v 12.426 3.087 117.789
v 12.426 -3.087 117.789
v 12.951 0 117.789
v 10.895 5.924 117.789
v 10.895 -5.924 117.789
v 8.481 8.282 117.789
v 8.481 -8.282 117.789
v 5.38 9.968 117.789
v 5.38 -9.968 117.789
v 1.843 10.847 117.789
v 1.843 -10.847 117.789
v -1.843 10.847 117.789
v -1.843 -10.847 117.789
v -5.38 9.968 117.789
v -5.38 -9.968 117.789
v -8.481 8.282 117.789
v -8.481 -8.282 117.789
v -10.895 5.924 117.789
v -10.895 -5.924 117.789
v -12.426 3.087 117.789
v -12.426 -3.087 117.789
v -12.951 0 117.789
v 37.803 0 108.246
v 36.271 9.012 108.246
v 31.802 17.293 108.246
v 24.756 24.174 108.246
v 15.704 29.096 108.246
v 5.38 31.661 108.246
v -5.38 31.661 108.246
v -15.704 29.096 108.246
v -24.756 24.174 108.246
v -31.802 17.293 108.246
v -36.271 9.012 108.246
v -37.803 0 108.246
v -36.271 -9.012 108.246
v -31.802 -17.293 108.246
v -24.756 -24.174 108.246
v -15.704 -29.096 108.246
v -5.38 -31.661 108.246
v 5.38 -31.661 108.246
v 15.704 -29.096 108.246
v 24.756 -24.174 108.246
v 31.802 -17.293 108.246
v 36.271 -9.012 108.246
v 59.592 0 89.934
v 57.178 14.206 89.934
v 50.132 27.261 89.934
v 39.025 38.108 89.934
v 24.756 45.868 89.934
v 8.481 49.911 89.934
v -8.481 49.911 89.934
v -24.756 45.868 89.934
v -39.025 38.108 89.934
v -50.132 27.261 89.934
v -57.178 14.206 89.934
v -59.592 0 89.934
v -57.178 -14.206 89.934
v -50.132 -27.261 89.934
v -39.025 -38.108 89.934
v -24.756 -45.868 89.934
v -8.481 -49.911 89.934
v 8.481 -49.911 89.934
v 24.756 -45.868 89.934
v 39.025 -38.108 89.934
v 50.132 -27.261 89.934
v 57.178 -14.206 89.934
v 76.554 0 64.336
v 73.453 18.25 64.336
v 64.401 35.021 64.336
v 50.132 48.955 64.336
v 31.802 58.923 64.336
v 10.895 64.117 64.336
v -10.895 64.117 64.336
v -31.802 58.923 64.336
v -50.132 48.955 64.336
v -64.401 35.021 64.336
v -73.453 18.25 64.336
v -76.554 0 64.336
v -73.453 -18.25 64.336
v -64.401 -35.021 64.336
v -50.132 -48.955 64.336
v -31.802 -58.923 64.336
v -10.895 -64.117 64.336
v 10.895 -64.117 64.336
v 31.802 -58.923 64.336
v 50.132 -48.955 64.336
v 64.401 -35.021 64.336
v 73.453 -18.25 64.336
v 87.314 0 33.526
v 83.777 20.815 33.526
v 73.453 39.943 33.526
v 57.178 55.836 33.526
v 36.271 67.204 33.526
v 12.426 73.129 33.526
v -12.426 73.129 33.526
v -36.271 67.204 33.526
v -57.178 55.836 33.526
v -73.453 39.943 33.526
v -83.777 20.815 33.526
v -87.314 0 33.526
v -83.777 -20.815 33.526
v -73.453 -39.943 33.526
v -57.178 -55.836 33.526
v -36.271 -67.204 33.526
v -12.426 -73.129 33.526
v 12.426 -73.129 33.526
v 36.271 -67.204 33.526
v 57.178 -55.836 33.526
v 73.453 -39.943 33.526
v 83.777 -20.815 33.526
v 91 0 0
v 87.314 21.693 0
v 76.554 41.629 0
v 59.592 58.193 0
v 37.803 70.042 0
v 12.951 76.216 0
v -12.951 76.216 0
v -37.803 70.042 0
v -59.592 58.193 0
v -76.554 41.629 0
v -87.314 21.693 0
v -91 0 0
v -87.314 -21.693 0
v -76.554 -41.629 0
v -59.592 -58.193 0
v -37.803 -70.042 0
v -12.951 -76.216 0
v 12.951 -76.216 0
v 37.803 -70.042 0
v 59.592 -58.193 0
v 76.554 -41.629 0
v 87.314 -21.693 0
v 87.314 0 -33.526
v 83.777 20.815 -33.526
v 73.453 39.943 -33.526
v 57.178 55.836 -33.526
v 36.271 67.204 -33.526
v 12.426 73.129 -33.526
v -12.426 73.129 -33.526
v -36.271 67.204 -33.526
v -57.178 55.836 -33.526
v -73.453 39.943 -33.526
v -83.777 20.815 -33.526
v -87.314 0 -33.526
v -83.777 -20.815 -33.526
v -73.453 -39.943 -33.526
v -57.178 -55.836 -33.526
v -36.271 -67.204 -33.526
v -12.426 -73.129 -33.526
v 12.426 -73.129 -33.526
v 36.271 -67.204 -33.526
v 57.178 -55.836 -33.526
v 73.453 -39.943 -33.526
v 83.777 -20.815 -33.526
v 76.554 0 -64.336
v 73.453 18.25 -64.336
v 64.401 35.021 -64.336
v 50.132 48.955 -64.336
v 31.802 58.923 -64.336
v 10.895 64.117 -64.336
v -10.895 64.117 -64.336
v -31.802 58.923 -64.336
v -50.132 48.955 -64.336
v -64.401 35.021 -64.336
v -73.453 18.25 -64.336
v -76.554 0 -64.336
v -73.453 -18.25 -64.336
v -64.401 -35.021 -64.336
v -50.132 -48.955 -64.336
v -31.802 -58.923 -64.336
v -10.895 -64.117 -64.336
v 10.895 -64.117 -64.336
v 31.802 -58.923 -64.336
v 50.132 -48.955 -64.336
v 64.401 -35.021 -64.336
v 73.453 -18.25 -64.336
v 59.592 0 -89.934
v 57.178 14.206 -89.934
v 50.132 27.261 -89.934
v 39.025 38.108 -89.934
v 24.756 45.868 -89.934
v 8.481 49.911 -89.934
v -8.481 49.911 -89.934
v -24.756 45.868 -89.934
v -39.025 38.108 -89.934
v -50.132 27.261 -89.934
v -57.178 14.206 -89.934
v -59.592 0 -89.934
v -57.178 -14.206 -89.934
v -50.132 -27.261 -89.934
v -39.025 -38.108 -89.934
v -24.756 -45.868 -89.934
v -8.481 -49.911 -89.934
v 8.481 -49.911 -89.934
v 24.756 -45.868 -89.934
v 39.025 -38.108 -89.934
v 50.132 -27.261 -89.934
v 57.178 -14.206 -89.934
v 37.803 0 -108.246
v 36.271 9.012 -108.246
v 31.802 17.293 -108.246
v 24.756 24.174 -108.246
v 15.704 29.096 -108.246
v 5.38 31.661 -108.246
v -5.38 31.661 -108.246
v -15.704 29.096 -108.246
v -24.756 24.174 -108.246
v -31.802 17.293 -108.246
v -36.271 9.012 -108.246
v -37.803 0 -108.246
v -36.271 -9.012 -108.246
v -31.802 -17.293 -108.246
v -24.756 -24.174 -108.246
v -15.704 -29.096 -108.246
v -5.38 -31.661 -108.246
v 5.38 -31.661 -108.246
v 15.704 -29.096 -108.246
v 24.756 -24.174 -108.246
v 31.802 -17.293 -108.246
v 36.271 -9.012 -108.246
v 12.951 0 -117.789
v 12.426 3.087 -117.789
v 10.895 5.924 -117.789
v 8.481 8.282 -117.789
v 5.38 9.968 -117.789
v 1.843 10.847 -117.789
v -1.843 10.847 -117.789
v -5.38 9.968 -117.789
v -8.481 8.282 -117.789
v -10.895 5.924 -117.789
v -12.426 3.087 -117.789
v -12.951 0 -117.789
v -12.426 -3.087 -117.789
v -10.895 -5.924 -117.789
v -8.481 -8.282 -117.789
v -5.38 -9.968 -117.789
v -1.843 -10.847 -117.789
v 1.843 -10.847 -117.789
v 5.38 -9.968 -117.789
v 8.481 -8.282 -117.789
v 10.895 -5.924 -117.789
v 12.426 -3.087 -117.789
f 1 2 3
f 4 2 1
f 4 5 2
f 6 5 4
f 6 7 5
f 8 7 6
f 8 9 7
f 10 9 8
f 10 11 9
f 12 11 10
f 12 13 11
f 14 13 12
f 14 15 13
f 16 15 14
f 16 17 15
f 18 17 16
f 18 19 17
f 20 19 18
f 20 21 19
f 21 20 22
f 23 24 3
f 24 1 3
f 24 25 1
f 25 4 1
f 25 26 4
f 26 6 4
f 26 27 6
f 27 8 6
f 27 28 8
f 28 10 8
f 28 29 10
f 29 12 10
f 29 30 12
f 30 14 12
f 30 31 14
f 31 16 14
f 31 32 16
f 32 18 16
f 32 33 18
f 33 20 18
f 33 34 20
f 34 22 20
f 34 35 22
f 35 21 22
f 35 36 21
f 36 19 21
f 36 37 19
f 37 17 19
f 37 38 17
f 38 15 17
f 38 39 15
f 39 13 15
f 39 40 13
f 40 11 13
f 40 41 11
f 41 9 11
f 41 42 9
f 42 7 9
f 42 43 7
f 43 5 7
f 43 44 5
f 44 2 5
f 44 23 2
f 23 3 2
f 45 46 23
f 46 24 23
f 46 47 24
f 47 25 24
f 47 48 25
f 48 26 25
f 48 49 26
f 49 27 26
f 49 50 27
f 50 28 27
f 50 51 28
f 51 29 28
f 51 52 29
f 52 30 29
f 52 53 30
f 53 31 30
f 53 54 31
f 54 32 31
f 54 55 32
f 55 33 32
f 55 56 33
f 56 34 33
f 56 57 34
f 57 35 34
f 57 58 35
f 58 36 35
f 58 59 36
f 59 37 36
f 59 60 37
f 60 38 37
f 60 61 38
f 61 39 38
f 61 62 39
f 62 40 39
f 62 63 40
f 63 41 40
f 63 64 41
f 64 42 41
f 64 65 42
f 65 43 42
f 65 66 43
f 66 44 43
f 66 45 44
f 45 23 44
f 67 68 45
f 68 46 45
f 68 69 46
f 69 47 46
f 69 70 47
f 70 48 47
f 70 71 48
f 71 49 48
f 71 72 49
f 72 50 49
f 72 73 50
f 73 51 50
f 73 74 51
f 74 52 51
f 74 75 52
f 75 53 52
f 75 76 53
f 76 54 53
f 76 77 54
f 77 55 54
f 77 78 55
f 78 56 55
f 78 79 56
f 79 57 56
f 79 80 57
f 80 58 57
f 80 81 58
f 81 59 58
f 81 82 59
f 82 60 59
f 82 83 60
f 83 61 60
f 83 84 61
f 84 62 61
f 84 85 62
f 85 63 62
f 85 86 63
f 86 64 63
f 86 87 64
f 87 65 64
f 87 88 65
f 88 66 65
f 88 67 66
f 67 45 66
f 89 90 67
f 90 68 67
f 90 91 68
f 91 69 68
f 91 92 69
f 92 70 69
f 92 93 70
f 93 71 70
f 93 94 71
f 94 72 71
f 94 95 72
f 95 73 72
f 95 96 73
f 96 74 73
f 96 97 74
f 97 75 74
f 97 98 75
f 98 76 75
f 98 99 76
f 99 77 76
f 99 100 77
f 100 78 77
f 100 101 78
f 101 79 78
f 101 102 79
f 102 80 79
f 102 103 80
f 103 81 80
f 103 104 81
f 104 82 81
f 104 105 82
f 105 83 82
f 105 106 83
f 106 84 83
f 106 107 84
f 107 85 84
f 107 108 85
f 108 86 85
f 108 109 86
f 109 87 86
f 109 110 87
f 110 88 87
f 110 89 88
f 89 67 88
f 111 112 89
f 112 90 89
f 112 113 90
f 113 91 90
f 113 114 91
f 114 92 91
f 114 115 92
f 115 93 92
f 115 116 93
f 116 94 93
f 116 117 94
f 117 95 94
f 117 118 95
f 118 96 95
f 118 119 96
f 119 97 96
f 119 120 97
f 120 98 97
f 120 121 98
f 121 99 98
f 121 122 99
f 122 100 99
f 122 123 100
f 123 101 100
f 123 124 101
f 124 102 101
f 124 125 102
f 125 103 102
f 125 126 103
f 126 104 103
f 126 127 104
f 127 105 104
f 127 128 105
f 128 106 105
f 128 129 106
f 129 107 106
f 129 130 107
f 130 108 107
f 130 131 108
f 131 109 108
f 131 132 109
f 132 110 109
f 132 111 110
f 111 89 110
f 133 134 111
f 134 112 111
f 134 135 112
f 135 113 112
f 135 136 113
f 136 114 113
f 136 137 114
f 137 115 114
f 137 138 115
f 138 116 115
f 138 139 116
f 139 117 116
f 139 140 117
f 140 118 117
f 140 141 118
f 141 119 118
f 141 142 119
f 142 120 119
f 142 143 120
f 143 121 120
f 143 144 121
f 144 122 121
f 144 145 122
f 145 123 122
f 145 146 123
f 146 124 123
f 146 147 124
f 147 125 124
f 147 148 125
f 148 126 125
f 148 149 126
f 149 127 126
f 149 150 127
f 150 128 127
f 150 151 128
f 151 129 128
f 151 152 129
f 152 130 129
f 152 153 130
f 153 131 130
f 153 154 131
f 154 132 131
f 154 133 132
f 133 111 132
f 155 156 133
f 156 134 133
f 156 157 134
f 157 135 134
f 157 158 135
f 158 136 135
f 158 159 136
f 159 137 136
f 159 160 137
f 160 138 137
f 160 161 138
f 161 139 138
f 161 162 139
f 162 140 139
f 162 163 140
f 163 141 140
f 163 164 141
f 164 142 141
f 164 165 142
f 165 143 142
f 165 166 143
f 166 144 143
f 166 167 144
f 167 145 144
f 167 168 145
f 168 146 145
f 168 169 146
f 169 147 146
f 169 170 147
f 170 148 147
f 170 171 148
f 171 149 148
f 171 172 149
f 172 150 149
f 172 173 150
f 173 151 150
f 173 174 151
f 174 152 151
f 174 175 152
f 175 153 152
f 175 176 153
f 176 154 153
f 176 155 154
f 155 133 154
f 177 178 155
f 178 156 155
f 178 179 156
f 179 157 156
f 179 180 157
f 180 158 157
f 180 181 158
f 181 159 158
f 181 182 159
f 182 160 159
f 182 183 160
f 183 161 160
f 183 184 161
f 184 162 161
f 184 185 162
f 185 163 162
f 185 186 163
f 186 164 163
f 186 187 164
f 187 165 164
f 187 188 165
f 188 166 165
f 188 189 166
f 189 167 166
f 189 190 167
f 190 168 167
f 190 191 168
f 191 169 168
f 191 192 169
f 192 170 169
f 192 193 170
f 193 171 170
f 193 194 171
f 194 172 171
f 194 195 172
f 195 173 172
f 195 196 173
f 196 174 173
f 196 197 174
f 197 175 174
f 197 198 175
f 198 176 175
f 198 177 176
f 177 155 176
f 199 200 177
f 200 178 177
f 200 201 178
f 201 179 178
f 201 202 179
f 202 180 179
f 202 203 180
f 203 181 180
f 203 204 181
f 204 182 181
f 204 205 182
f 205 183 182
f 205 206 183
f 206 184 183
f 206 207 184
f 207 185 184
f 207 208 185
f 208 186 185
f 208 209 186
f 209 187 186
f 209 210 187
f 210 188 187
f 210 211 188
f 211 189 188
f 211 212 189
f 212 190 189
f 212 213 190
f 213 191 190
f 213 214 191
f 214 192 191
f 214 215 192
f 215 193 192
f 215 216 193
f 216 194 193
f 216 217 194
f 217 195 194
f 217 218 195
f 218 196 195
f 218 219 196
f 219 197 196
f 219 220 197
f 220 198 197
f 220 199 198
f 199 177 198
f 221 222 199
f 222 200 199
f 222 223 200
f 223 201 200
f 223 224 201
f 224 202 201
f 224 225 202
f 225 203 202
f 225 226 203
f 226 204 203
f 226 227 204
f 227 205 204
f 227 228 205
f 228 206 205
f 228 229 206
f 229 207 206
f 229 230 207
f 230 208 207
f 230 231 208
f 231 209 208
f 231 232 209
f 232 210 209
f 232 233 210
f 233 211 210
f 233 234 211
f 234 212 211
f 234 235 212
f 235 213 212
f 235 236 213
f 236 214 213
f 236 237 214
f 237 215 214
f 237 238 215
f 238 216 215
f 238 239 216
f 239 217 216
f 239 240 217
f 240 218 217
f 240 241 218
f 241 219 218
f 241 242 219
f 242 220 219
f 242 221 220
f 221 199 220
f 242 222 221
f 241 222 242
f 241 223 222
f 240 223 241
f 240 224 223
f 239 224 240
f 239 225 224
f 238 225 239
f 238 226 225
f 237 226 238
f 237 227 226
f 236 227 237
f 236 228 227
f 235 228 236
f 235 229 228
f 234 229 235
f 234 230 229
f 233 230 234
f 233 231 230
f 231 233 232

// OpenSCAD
// Generated by SolidPython 1.0.1 on 2020-07-29 00:46:51


scale(v = [13, 11, 17]) {
	sphere(r = 7);
}
/***********************************************
*********      SolidPython code:      **********
************************************************
 
# import packages: SolidPython
from solid import *
from solid.utils import *
from itertools import chain, combinations, permutations


class Resize:

    def __init__(self, scad_file):
        self.scad_file = scad_file
        #self.scad_file = import_scad(scad_file)
        # cone/cylinder param:
        self.r1 = 0
        self.r2 = 0
        self.h = 0
        # rectangular prism param:
        self.w = 0
        self.l = 0
        # ellipse param:
        self.r = 0

    # import OpenScad code (file name corresponds to shape)


    # classify shape + parameters
    def assign(self, param1, param2, param3):
        if self.scad_file == 'cone.scad':
            self.r1 = param1
            self.r2 = param2
            self.h = param3
        elif self.scad_file == 'cylinder.scad':
            self.r1 = param1
            self.r2 = param2
            self.h = param3
        elif self.scad_file == 'rectangularPrism.scad':
            self.h = param1
            self.l = param2
            self.w = param3
        else:
            self.r = param1
            self.h = param2

    # resize parameters
    def iterate(self):
        x = range(3, 20, 2)
        i = 1
        if self.scad_file == 'cone.scad':
            tempList = list(permutations(x, 2))
            for temp in tempList:
                param1 = temp[0]
                param2 = temp[1]
                filepath = 'produced_scad_files/' + 'cone' + str(param1) + '_' + str(param2) + '_' + '.scad'
                scad_render_to_file(cylinder(h=param1, r1=param2, r2=0), filepath)

        elif self.scad_file == 'cylinder.scad':
            tempList = list(permutations(x, 3))
            for temp in tempList:
                param1 = temp[0]
                param2 = temp[1]
                filepath = 'produced_scad_files/' + 'cylinder' + str(param1) + '_' + str(param2) + '_' + '.scad'
                scad_render_to_file(cylinder(h=param1, r1=param2, r2=param2), filepath)

        elif self.scad_file == 'rectangularPrism.scad':
            tempList = list(permutations(x, 3))
            for temp in tempList:
                param1 = temp[0]
                param2 = temp[1]
                param3 = temp[2]
                filepath = 'produced_scad_files/' + 'rectangularPrism' + str(param1) + '_' + str(param2) + '_' + str(
                    param3) + '.scad'
                scad_render_to_file(cube(size=(param1, param2, param3)), filepath)

        elif self.scad_file == 'ellipse.scad':
            tempList = list(permutations(x, 4))
            for temp in tempList:
                param1 = temp[0]
                param2 = temp[1]
                param3 = temp[2]
                param4 = temp[3]
                filepath = 'produced_scad_files/' + 'ellipse' + str(param1) + '_' + str(param2) + '_' + str(param3) + '_' + str(param4) + '.scad'
                scad_render_to_file(scale([param1, param2, param3])(sphere(r=param4)), filepath)

    def render_to_scadfile(self):
        scad_render_to_file(scad, 'example.scad') 
 
************************************************/
